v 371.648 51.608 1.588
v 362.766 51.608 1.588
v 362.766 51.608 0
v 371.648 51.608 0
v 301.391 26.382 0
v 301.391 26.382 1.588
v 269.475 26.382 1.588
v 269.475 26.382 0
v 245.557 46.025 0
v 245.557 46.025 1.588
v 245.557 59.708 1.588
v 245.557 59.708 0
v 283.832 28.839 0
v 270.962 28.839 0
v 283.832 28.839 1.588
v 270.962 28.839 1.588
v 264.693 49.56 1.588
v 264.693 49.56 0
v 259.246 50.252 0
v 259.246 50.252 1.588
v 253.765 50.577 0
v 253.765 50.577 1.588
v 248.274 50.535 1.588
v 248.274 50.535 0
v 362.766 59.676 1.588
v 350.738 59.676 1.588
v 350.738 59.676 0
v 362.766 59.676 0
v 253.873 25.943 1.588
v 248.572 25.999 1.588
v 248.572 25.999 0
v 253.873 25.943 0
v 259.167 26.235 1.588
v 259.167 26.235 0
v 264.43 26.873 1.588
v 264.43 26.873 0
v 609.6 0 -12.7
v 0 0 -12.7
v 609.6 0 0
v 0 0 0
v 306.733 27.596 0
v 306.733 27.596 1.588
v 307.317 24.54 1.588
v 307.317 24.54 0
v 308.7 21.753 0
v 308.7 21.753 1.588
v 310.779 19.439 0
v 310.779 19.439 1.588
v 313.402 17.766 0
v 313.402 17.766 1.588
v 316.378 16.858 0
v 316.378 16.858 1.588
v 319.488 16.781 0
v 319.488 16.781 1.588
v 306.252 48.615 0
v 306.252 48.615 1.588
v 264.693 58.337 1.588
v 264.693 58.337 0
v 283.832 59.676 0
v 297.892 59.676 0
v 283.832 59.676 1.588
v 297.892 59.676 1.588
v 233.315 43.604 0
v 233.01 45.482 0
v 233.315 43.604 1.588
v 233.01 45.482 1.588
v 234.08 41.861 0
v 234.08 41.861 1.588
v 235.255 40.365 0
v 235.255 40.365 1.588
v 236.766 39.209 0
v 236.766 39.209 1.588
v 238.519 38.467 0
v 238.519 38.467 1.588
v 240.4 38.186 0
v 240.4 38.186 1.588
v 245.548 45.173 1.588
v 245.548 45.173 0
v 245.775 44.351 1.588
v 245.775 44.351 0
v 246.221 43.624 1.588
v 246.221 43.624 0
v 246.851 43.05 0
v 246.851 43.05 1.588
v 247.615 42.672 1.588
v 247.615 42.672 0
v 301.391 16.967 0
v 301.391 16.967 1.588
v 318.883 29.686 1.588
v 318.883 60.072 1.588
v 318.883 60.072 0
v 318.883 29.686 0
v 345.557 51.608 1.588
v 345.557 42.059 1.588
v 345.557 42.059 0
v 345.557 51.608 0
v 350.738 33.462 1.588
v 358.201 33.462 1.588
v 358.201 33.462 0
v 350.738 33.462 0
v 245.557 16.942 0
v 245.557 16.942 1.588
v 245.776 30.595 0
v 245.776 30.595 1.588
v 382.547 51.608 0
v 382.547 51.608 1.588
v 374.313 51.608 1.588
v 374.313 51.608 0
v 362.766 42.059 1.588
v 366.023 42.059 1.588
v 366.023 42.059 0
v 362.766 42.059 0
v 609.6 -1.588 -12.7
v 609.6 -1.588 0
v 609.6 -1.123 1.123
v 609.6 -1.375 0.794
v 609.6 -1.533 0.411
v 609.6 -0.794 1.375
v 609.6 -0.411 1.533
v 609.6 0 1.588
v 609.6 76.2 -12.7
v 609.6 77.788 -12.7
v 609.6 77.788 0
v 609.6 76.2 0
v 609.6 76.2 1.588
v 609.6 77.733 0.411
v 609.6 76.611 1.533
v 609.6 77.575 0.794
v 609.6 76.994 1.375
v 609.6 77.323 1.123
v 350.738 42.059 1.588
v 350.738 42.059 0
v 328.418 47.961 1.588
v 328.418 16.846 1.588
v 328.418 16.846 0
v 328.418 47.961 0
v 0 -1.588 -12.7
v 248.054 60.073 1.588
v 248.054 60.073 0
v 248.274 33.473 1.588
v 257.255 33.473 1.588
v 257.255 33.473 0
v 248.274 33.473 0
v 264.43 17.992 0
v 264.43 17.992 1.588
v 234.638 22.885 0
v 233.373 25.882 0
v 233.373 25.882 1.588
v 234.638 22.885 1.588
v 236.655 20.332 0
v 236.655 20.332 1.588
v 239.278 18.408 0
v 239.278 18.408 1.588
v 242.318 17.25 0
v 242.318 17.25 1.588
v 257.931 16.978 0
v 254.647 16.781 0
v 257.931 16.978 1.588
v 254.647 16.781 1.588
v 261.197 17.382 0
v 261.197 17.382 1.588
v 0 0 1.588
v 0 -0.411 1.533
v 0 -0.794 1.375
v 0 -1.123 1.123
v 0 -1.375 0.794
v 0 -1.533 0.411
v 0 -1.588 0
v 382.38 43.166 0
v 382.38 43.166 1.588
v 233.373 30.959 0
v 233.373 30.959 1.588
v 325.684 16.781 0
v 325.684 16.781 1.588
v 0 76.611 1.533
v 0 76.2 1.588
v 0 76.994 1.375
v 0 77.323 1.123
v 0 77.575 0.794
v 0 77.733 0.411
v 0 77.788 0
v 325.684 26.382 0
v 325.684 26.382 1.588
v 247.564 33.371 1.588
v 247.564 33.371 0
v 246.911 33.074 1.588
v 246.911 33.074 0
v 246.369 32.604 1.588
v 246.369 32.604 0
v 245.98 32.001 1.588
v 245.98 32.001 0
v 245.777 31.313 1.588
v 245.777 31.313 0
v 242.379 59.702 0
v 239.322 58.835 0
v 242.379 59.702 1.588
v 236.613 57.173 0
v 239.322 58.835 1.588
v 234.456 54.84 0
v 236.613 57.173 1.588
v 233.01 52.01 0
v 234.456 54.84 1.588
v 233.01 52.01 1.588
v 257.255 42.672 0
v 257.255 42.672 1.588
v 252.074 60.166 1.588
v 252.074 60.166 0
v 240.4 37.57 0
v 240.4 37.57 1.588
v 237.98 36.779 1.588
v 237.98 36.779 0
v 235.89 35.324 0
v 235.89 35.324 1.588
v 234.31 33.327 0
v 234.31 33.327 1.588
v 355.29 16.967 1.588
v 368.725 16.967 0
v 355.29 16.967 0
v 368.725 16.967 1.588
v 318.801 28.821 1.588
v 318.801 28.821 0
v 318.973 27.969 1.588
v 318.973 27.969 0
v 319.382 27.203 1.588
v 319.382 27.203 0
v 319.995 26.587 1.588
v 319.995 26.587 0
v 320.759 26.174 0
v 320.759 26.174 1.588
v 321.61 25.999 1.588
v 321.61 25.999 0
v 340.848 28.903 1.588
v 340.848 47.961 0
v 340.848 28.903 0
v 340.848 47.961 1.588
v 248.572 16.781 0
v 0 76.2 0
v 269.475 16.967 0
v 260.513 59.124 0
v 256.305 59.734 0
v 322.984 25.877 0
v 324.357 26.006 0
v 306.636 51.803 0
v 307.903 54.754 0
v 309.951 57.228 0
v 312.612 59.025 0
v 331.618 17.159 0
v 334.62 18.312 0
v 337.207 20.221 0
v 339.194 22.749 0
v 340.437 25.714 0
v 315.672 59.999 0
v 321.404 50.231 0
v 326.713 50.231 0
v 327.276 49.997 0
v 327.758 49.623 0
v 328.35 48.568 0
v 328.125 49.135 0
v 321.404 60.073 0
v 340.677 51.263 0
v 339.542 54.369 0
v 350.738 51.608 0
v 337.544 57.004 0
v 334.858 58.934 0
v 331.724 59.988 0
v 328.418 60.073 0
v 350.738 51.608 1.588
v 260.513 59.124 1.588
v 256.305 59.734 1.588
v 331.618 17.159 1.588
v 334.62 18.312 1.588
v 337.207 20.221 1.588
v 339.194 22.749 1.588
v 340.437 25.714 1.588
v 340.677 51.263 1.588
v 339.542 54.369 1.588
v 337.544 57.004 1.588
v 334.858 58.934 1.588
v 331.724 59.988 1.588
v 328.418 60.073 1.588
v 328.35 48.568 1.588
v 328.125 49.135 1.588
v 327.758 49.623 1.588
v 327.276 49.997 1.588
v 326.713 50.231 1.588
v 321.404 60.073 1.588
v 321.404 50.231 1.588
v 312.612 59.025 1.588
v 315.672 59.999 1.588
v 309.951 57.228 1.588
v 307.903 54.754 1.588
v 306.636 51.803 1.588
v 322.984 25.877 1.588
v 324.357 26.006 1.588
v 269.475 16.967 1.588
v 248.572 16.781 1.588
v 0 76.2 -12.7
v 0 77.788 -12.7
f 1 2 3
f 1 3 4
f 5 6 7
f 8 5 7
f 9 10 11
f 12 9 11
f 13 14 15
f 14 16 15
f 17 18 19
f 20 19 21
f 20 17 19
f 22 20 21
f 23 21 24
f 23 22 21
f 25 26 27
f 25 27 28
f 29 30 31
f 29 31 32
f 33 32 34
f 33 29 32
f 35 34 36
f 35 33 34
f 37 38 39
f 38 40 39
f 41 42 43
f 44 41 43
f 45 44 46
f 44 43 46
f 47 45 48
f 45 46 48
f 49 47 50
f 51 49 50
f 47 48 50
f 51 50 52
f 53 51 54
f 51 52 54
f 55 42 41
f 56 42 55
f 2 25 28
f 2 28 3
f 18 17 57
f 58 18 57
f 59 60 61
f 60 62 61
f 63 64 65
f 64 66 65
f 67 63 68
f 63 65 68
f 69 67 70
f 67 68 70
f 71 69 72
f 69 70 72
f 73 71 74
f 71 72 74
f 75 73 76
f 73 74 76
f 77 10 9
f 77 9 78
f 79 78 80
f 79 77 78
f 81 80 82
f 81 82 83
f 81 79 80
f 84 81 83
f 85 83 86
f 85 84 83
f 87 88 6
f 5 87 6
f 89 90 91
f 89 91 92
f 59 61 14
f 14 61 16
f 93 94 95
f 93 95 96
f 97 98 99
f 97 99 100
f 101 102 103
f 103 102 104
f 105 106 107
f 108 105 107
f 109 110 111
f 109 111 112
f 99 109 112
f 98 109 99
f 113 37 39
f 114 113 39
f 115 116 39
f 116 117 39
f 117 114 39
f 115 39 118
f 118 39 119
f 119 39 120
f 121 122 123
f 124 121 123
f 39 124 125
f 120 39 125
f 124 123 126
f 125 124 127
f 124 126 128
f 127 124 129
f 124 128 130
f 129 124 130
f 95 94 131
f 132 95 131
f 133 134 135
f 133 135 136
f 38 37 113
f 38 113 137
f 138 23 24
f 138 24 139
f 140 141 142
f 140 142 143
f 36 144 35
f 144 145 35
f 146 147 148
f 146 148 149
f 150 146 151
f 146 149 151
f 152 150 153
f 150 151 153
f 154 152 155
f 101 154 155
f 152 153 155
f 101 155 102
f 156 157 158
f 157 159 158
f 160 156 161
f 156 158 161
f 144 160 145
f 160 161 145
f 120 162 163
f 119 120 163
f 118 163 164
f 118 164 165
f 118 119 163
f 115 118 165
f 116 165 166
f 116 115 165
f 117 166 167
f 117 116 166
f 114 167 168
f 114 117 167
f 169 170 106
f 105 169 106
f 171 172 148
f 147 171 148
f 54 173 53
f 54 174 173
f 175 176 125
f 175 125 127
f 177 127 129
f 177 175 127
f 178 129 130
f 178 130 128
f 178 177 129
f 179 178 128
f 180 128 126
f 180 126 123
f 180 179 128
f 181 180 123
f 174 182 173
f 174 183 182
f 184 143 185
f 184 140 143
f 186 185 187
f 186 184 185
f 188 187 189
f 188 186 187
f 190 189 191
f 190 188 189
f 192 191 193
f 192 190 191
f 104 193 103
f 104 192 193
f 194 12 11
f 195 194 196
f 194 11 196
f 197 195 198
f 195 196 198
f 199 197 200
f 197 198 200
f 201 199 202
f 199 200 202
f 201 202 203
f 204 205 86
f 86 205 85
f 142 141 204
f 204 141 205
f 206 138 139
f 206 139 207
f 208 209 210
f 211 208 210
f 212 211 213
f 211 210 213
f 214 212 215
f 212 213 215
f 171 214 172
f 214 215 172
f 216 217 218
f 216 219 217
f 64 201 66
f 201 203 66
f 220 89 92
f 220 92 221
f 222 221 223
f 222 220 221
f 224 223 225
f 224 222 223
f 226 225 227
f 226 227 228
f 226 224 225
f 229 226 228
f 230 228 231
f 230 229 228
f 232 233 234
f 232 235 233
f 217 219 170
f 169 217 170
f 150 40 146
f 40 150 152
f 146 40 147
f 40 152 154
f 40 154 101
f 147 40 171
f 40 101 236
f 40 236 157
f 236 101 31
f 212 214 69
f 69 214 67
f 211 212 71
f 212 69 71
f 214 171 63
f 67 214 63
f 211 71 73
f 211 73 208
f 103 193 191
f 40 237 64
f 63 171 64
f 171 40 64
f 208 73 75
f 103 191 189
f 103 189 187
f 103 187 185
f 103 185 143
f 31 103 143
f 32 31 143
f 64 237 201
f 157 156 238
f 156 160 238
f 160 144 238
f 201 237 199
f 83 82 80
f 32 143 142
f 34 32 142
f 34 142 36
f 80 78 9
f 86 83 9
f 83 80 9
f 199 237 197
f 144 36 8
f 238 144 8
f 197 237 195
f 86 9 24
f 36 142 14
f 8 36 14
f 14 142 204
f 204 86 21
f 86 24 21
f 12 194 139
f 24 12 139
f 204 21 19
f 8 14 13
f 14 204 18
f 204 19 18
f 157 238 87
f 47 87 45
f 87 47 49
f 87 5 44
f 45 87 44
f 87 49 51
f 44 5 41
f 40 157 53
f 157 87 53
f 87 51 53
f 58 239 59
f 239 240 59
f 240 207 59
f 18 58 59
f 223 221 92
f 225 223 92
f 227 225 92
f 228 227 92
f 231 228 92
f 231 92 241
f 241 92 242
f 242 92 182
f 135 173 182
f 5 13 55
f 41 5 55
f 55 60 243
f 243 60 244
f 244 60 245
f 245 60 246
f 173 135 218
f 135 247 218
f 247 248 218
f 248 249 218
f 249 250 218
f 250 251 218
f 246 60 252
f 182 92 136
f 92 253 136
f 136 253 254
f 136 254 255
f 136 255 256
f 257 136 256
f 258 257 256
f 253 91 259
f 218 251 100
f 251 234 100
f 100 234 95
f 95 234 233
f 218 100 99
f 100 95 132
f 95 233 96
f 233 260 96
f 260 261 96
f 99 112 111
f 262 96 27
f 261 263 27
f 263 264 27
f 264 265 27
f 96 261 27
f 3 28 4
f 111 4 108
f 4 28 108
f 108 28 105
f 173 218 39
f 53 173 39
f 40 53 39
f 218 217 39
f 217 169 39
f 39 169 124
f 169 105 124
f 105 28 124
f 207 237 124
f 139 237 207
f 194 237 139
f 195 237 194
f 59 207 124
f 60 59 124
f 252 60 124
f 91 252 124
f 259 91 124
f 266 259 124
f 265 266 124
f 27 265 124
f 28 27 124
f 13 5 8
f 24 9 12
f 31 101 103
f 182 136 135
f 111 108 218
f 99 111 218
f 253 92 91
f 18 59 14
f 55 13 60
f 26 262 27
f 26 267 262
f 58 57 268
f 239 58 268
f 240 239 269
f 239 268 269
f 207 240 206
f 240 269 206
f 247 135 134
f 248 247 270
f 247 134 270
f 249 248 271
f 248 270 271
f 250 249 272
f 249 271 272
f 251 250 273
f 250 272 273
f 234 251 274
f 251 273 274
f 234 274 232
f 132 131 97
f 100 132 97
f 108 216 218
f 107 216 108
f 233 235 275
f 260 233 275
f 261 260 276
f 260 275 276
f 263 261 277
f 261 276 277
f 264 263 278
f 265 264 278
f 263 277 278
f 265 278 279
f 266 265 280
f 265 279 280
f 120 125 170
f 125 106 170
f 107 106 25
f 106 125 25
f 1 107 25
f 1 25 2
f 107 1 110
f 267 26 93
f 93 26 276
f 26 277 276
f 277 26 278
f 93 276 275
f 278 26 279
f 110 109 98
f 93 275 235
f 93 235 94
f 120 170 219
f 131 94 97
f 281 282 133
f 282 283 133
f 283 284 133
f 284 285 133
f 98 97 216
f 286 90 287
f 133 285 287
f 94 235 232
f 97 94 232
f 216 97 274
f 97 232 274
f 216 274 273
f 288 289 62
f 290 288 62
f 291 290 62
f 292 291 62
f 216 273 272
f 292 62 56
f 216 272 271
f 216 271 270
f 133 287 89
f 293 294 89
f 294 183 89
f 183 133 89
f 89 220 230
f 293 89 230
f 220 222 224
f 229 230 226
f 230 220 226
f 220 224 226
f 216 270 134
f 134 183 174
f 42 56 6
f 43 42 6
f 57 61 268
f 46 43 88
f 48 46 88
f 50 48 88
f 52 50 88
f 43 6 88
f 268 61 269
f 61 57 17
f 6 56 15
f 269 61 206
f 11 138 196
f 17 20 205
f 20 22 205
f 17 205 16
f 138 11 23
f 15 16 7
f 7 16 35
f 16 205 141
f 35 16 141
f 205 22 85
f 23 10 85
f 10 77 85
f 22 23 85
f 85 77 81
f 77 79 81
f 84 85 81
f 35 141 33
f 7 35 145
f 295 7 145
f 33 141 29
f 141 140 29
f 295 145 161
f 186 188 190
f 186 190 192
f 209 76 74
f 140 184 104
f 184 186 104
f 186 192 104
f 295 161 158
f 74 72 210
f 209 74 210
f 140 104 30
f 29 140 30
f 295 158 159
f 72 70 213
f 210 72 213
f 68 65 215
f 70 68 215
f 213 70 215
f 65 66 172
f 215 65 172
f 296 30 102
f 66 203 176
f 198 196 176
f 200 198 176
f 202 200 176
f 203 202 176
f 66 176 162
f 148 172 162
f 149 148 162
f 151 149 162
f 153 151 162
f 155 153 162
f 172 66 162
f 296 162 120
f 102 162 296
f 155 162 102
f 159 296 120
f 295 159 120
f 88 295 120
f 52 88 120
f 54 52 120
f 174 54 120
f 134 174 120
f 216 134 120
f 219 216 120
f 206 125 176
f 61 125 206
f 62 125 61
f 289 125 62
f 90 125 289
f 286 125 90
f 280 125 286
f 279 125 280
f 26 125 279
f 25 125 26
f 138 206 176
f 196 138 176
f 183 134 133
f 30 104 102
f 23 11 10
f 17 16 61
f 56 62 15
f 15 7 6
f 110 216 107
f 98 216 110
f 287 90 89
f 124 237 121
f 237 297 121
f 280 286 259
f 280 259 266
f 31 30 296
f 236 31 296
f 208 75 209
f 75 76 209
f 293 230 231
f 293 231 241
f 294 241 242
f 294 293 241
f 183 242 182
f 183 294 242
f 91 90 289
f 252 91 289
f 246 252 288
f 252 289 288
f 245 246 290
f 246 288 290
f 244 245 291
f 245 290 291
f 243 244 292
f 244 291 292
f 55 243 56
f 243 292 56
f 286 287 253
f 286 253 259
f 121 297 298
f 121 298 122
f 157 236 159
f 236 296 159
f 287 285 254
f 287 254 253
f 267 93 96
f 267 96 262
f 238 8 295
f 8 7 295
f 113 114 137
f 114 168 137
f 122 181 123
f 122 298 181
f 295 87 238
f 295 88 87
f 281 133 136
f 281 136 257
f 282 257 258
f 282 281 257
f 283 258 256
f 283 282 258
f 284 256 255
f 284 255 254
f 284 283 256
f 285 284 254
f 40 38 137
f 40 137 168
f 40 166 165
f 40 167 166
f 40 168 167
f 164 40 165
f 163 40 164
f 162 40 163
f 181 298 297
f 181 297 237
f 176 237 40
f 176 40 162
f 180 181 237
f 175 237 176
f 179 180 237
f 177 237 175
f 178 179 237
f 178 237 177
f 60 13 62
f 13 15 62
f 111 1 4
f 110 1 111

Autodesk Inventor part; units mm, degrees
ref_plane "YZ Plane" through (0, 0, 0) normal (1, 0, 0) x (0, 1, 0)
ref_plane "XZ Plane" through (0, 0, 0) normal (0, 1, 0) x (-1, 0, 0)
ref_plane "XY Plane" through (0, 0, 0) normal (0, 0, 1) x (1, 0, 0)
sketch "Sketch1" plane through (0, 0, 0) normal (0, 0, 1) x (1, 0, 0)
  line L0 (0, 0) -> (609.6, 0)
  line L1 (609.6, 0) -> (609.6, 76.2)
  line L2 (609.6, 76.2) -> (0, 76.2)
  line L3 (0, 76.2) -> (0, 0)
  dimension "d0" = 609.6
  dimension "d1" = 76.2
extrude "Extrusion1" add sketch "Sketch1" along normal blind 1.5875
sketch "Sketch2" plane through (0, 76.2, 0) normal (0, 1, 0) x (1, 0, 0)
  line L0 (609.6, 0) -> (0, 0) projected
  line L1 (0, 0) -> (0, -1.5875) projected
  line L2 (609.6, -1.5875) -> (0, -1.5875) projected
  line L3 (609.6, 0) -> (609.6, -1.5875) projected
  line L4 (609.6, -1.5875) -> (0, -1.5875)
  line L5 (0, -1.5875) -> (0, 12.7)
  line L6 (0, 12.7) -> (609.6, 12.7)
  line L7 (609.6, 12.7) -> (609.6, -1.5875)
  dimension "d39" = 12.7
extrude "Extrusion2" add sketch "Sketch2" along normal blind 1.5875
fillet "Fillet1" radius 1.5875 1 edges at (304.8, 77.7875, 1.5875)
sketch "Sketch3" plane through (0, 0, 0) normal (0, -1, 0) x (1, 0, 0)
  line L0 (609.6, 0) -> (0, 0) projected
  line L1 (0, -12.7) -> (0, 0) projected
  line L2 (609.6, -12.7) -> (0, -12.7) projected
  line L3 (609.6, 0) -> (609.6, -12.7) projected
extrude "Extrusion3" add sketch "Sketch3" along normal blind 1.5875
sketch "Sketch4" plane through (0, 76.2, -12.7) normal (-1, 0, 0) x (0, 0, 1)
  line L0 (12.7, -76.2) -> (0, -76.2) projected
  line L1 (0, -76.2) -> (0, -77.7875) projected
  line L2 (12.7, -77.7875) -> (0, -77.7875) projected
  line L3 (12.7, -76.2) -> (12.7, -77.7875) projected
  arc A0 (14.2875, 0) -> (12.7, 1.5875) centre (12.7, 0) ccw projected
  line L4 (0, 1.5875) -> (12.7, 1.5875) projected
  line L5 (0, 0) -> (0, 1.5875) projected
  line L6 (0, 0) -> (12.7, 0) projected
  line L7 (12.7, 0) -> (12.7, -76.2) projected
  line L8 (12.7, -76.2) -> (14.2875, -76.2) projected
  line L9 (14.2875, -76.2) -> (14.2875, 0) projected
  line L10 (12.7, -76.2) -> (14.2875, -76.2)
  line L11 (14.2875, -76.2) -> (14.2875, -77.7875)
  line L12 (14.2875, -77.7875) -> (12.7, -77.7875)
  line L13 (12.7, -77.7875) -> (12.7, -76.2)
extrude "Extrusion4" add sketch "Sketch4" against normal up to surface (609.6 mm away) contours L8 L11 L12 L3
fillet "Fillet2" radius 1.5875 1 edges at (304.8, -1.5875, 1.5875)
sketch "Sketch5" plane through (0, 0, 1.5875) normal (0, 0, 1) x (1, 0, 0)
  line L0 (391.8077, 9.2075) -> (217.7923, 9.2075) construction
  line L1 (217.7923, 9.2075) -> (217.7923, 67.0009) construction
  line L2 (217.7923, 67.0009) -> (391.8077, 67.0009) construction
  line L3 (391.8077, 67.0009) -> (391.8077, 9.2075) construction
  line L4 (368.7246, 16.9668) -> (355.2902, 16.9668)
  line L5 (355.2902, 16.9668) -> (374.313, 51.6075)
  line L6 (366.0229, 42.0591) -> (362.766, 42.0591)
  line L7 (362.766, 42.0591) -> (358.2013, 33.4623)
  line L8 (358.2013, 33.4623) -> (350.738, 33.4623)
  line L9 (345.5567, 42.0591) -> (345.5567, 51.6075)
  line L10 (345.5567, 51.6075) -> (350.738, 51.6075)
  line L11 (350.738, 51.6075) -> (350.738, 59.6755)
  line L12 (350.738, 59.6755) -> (362.766, 59.6755)
  line L13 (362.766, 59.6755) -> (362.766, 51.6075)
  line L14 (362.766, 51.6075) -> (371.6483, 51.6075)
  line L15 (371.6483, 51.6075) -> (366.0229, 42.0591)
  line L16 (283.8325, 28.8388) -> (297.8915, 59.6755)
  line L17 (283.8325, 59.6755) -> (270.9618, 28.8388)
  line L18 (270.9618, 28.8388) -> (283.8325, 28.8388)
  line L19 (301.3907, 16.9668) -> (301.3907, 26.3815)
  line L20 (301.3907, 26.3815) -> (269.4747, 26.3815)
  line L21 (301.3907, 16.9668) -> (269.4747, 16.9668)
  line L22 (328.4185, 16.8456) -> (328.4185, 47.9611)
  line L23 (321.4042, 50.2314) -> (321.4042, 60.0732)
  line L24 (340.8479, 47.9611) -> (340.8479, 28.9034)
  arc A0 (328.4185, 47.9611) -> (326.7126, 50.2314) centre (326.1181, 48.0086) ccw
  arc A1 (328.4185, 16.8456) -> (340.8479, 28.9034) centre (328.8598, 28.8258) ccw
  line L25 (318.8829, 60.0719) -> (318.8829, 29.6859)
  line L26 (325.6836, 26.3815) -> (325.6836, 16.781)
  line L27 (325.6836, 16.781) -> (319.4882, 16.781)
  arc A2 (306.7329, 27.5963) -> (319.4882, 16.781) centre (318.2151, 28.2088) ccw
  line L28 (306.7329, 27.5963) -> (306.252, 48.615)
  arc A3 (318.8829, 60.0719) -> (306.252, 48.615) centre (317.5294, 48.873) ccw
  line L29 (321.4042, 60.0732) -> (328.4185, 60.0732)
  arc A4 (340.8479, 47.9611) -> (328.4185, 60.0732) centre (329.7877, 49.0447) ccw
  line L30 (609.6, 0) -> (609.6, 76.2) projected
  line L31 (0, 0) -> (0, 76.2) projected
  line L32 (609.6, 0) -> (0, 0) projected
  line L33 (0, 76.2) -> (609.6, 76.2) projected
  line L34 (297.8915, 59.6755) -> (283.8325, 59.6755)
  line L35 (269.4747, 26.3815) -> (269.4747, 16.9668)
  line L36 (326.7126, 50.2314) -> (321.4042, 50.2314)
  line L37 (368.7246, 16.9668) -> (382.3802, 43.1657)
  line L38 (382.3802, 43.1657) -> (382.5469, 51.6075)
  line L39 (382.5469, 51.6075) -> (374.313, 51.6075)
  line L40 (345.5567, 42.0591) -> (350.738, 42.0591)
  line L41 (350.738, 42.0591) -> (350.738, 33.4623)
  arc A5 (318.8829, 29.6859) -> (321.6099, 25.999) centre (321.7802, 28.9769) ccw
  arc A6 (321.6099, 25.999) -> (325.6836, 26.3815) centre (322.9641, 33.4611) ccw
  line L42 (257.2547, 33.4734) -> (257.2547, 42.6715)
  line L43 (257.2547, 42.6715) -> (247.6149, 42.6715)
  line L44 (245.5572, 46.0253) -> (245.5572, 59.7083)
  line L45 (233.0099, 52.0098) -> (233.0099, 45.4817)
  line L46 (240.4004, 38.1857) -> (240.4004, 37.57)
  line L47 (233.3728, 30.9594) -> (233.3728, 25.8822)
  line L48 (245.5572, 16.9419) -> (245.7765, 30.5952)
  arc A7 (233.3728, 25.8822) -> (245.5572, 16.9419) centre (245.0741, 29.0566) ccw
  arc A8 (240.4004, 37.57) -> (233.3728, 30.9594) centre (241.8707, 28.9661) ccw
  arc A9 (233.0099, 45.4817) -> (240.4004, 38.1857) centre (240.5679, 45.7465) ccw
  line L49 (257.2547, 33.4734) -> (248.2741, 33.4734)
  arc A10 (248.2741, 33.4734) -> (245.7765, 30.5952) centre (248.2741, 30.9507) ccw
  arc A11 (245.5572, 46.0253) -> (247.6149, 42.6715) centre (248.5719, 45.5669) ccw
  arc A12 (245.5572, 59.7083) -> (233.0099, 52.0098) centre (243.9929, 48.1836) ccw
  line L50 (264.4301, 17.9919) -> (264.4301, 26.8729)
  arc A13 (254.6467, 16.781) -> (264.4301, 17.9919) centre (253.1662, 68.8681) ccw
  line L51 (248.5719, 25.999) -> (248.5719, 16.781)
  line L52 (248.5719, 16.781) -> (254.6467, 16.781)
  arc A14 (248.5719, 25.999) -> (264.4301, 26.8729) centre (252.074, 106.7711) ccw
  arc A15 (264.6926, 49.5598) -> (248.2741, 50.5346) centre (251.6559, -31.2579) ccw
  line L53 (248.2741, 50.5346) -> (248.0544, 60.0732)
  line L54 (248.0544, 60.0732) -> (252.074, 60.1658)
  line L55 (264.6926, 49.5598) -> (264.6926, 58.3373)
  arc A16 (264.6926, 58.3373) -> (252.074, 60.1658) centre (243.9281, -40.5085) ccw
  point P0 (0, 38.1)
  point P1 (217.7923, 38.1042)
extrude "Extrusion9" cut sketch "Sketch5" against normal blind 25.4 contours L4 L5 L39 L38 L37 | L6 L7 L8 L41 L40 L9 L10 L11 L12 L13 L14 L15 | L18 L17 L34 L16 | L21 L35 L20 L19 | L22 A0 L36 L23 L29 A4 L24 A1 | L25 A5 A6 L26 L27 A2 L28 A3 | L49 A10 L48 A7 L47 A8 L46 A9 L45 A12 L44 A11 L43 L42 | A13 L52 L51 A14 L50 | A15 L53 L54 A16 L55
properties part number "Chassis FrontandBack"
